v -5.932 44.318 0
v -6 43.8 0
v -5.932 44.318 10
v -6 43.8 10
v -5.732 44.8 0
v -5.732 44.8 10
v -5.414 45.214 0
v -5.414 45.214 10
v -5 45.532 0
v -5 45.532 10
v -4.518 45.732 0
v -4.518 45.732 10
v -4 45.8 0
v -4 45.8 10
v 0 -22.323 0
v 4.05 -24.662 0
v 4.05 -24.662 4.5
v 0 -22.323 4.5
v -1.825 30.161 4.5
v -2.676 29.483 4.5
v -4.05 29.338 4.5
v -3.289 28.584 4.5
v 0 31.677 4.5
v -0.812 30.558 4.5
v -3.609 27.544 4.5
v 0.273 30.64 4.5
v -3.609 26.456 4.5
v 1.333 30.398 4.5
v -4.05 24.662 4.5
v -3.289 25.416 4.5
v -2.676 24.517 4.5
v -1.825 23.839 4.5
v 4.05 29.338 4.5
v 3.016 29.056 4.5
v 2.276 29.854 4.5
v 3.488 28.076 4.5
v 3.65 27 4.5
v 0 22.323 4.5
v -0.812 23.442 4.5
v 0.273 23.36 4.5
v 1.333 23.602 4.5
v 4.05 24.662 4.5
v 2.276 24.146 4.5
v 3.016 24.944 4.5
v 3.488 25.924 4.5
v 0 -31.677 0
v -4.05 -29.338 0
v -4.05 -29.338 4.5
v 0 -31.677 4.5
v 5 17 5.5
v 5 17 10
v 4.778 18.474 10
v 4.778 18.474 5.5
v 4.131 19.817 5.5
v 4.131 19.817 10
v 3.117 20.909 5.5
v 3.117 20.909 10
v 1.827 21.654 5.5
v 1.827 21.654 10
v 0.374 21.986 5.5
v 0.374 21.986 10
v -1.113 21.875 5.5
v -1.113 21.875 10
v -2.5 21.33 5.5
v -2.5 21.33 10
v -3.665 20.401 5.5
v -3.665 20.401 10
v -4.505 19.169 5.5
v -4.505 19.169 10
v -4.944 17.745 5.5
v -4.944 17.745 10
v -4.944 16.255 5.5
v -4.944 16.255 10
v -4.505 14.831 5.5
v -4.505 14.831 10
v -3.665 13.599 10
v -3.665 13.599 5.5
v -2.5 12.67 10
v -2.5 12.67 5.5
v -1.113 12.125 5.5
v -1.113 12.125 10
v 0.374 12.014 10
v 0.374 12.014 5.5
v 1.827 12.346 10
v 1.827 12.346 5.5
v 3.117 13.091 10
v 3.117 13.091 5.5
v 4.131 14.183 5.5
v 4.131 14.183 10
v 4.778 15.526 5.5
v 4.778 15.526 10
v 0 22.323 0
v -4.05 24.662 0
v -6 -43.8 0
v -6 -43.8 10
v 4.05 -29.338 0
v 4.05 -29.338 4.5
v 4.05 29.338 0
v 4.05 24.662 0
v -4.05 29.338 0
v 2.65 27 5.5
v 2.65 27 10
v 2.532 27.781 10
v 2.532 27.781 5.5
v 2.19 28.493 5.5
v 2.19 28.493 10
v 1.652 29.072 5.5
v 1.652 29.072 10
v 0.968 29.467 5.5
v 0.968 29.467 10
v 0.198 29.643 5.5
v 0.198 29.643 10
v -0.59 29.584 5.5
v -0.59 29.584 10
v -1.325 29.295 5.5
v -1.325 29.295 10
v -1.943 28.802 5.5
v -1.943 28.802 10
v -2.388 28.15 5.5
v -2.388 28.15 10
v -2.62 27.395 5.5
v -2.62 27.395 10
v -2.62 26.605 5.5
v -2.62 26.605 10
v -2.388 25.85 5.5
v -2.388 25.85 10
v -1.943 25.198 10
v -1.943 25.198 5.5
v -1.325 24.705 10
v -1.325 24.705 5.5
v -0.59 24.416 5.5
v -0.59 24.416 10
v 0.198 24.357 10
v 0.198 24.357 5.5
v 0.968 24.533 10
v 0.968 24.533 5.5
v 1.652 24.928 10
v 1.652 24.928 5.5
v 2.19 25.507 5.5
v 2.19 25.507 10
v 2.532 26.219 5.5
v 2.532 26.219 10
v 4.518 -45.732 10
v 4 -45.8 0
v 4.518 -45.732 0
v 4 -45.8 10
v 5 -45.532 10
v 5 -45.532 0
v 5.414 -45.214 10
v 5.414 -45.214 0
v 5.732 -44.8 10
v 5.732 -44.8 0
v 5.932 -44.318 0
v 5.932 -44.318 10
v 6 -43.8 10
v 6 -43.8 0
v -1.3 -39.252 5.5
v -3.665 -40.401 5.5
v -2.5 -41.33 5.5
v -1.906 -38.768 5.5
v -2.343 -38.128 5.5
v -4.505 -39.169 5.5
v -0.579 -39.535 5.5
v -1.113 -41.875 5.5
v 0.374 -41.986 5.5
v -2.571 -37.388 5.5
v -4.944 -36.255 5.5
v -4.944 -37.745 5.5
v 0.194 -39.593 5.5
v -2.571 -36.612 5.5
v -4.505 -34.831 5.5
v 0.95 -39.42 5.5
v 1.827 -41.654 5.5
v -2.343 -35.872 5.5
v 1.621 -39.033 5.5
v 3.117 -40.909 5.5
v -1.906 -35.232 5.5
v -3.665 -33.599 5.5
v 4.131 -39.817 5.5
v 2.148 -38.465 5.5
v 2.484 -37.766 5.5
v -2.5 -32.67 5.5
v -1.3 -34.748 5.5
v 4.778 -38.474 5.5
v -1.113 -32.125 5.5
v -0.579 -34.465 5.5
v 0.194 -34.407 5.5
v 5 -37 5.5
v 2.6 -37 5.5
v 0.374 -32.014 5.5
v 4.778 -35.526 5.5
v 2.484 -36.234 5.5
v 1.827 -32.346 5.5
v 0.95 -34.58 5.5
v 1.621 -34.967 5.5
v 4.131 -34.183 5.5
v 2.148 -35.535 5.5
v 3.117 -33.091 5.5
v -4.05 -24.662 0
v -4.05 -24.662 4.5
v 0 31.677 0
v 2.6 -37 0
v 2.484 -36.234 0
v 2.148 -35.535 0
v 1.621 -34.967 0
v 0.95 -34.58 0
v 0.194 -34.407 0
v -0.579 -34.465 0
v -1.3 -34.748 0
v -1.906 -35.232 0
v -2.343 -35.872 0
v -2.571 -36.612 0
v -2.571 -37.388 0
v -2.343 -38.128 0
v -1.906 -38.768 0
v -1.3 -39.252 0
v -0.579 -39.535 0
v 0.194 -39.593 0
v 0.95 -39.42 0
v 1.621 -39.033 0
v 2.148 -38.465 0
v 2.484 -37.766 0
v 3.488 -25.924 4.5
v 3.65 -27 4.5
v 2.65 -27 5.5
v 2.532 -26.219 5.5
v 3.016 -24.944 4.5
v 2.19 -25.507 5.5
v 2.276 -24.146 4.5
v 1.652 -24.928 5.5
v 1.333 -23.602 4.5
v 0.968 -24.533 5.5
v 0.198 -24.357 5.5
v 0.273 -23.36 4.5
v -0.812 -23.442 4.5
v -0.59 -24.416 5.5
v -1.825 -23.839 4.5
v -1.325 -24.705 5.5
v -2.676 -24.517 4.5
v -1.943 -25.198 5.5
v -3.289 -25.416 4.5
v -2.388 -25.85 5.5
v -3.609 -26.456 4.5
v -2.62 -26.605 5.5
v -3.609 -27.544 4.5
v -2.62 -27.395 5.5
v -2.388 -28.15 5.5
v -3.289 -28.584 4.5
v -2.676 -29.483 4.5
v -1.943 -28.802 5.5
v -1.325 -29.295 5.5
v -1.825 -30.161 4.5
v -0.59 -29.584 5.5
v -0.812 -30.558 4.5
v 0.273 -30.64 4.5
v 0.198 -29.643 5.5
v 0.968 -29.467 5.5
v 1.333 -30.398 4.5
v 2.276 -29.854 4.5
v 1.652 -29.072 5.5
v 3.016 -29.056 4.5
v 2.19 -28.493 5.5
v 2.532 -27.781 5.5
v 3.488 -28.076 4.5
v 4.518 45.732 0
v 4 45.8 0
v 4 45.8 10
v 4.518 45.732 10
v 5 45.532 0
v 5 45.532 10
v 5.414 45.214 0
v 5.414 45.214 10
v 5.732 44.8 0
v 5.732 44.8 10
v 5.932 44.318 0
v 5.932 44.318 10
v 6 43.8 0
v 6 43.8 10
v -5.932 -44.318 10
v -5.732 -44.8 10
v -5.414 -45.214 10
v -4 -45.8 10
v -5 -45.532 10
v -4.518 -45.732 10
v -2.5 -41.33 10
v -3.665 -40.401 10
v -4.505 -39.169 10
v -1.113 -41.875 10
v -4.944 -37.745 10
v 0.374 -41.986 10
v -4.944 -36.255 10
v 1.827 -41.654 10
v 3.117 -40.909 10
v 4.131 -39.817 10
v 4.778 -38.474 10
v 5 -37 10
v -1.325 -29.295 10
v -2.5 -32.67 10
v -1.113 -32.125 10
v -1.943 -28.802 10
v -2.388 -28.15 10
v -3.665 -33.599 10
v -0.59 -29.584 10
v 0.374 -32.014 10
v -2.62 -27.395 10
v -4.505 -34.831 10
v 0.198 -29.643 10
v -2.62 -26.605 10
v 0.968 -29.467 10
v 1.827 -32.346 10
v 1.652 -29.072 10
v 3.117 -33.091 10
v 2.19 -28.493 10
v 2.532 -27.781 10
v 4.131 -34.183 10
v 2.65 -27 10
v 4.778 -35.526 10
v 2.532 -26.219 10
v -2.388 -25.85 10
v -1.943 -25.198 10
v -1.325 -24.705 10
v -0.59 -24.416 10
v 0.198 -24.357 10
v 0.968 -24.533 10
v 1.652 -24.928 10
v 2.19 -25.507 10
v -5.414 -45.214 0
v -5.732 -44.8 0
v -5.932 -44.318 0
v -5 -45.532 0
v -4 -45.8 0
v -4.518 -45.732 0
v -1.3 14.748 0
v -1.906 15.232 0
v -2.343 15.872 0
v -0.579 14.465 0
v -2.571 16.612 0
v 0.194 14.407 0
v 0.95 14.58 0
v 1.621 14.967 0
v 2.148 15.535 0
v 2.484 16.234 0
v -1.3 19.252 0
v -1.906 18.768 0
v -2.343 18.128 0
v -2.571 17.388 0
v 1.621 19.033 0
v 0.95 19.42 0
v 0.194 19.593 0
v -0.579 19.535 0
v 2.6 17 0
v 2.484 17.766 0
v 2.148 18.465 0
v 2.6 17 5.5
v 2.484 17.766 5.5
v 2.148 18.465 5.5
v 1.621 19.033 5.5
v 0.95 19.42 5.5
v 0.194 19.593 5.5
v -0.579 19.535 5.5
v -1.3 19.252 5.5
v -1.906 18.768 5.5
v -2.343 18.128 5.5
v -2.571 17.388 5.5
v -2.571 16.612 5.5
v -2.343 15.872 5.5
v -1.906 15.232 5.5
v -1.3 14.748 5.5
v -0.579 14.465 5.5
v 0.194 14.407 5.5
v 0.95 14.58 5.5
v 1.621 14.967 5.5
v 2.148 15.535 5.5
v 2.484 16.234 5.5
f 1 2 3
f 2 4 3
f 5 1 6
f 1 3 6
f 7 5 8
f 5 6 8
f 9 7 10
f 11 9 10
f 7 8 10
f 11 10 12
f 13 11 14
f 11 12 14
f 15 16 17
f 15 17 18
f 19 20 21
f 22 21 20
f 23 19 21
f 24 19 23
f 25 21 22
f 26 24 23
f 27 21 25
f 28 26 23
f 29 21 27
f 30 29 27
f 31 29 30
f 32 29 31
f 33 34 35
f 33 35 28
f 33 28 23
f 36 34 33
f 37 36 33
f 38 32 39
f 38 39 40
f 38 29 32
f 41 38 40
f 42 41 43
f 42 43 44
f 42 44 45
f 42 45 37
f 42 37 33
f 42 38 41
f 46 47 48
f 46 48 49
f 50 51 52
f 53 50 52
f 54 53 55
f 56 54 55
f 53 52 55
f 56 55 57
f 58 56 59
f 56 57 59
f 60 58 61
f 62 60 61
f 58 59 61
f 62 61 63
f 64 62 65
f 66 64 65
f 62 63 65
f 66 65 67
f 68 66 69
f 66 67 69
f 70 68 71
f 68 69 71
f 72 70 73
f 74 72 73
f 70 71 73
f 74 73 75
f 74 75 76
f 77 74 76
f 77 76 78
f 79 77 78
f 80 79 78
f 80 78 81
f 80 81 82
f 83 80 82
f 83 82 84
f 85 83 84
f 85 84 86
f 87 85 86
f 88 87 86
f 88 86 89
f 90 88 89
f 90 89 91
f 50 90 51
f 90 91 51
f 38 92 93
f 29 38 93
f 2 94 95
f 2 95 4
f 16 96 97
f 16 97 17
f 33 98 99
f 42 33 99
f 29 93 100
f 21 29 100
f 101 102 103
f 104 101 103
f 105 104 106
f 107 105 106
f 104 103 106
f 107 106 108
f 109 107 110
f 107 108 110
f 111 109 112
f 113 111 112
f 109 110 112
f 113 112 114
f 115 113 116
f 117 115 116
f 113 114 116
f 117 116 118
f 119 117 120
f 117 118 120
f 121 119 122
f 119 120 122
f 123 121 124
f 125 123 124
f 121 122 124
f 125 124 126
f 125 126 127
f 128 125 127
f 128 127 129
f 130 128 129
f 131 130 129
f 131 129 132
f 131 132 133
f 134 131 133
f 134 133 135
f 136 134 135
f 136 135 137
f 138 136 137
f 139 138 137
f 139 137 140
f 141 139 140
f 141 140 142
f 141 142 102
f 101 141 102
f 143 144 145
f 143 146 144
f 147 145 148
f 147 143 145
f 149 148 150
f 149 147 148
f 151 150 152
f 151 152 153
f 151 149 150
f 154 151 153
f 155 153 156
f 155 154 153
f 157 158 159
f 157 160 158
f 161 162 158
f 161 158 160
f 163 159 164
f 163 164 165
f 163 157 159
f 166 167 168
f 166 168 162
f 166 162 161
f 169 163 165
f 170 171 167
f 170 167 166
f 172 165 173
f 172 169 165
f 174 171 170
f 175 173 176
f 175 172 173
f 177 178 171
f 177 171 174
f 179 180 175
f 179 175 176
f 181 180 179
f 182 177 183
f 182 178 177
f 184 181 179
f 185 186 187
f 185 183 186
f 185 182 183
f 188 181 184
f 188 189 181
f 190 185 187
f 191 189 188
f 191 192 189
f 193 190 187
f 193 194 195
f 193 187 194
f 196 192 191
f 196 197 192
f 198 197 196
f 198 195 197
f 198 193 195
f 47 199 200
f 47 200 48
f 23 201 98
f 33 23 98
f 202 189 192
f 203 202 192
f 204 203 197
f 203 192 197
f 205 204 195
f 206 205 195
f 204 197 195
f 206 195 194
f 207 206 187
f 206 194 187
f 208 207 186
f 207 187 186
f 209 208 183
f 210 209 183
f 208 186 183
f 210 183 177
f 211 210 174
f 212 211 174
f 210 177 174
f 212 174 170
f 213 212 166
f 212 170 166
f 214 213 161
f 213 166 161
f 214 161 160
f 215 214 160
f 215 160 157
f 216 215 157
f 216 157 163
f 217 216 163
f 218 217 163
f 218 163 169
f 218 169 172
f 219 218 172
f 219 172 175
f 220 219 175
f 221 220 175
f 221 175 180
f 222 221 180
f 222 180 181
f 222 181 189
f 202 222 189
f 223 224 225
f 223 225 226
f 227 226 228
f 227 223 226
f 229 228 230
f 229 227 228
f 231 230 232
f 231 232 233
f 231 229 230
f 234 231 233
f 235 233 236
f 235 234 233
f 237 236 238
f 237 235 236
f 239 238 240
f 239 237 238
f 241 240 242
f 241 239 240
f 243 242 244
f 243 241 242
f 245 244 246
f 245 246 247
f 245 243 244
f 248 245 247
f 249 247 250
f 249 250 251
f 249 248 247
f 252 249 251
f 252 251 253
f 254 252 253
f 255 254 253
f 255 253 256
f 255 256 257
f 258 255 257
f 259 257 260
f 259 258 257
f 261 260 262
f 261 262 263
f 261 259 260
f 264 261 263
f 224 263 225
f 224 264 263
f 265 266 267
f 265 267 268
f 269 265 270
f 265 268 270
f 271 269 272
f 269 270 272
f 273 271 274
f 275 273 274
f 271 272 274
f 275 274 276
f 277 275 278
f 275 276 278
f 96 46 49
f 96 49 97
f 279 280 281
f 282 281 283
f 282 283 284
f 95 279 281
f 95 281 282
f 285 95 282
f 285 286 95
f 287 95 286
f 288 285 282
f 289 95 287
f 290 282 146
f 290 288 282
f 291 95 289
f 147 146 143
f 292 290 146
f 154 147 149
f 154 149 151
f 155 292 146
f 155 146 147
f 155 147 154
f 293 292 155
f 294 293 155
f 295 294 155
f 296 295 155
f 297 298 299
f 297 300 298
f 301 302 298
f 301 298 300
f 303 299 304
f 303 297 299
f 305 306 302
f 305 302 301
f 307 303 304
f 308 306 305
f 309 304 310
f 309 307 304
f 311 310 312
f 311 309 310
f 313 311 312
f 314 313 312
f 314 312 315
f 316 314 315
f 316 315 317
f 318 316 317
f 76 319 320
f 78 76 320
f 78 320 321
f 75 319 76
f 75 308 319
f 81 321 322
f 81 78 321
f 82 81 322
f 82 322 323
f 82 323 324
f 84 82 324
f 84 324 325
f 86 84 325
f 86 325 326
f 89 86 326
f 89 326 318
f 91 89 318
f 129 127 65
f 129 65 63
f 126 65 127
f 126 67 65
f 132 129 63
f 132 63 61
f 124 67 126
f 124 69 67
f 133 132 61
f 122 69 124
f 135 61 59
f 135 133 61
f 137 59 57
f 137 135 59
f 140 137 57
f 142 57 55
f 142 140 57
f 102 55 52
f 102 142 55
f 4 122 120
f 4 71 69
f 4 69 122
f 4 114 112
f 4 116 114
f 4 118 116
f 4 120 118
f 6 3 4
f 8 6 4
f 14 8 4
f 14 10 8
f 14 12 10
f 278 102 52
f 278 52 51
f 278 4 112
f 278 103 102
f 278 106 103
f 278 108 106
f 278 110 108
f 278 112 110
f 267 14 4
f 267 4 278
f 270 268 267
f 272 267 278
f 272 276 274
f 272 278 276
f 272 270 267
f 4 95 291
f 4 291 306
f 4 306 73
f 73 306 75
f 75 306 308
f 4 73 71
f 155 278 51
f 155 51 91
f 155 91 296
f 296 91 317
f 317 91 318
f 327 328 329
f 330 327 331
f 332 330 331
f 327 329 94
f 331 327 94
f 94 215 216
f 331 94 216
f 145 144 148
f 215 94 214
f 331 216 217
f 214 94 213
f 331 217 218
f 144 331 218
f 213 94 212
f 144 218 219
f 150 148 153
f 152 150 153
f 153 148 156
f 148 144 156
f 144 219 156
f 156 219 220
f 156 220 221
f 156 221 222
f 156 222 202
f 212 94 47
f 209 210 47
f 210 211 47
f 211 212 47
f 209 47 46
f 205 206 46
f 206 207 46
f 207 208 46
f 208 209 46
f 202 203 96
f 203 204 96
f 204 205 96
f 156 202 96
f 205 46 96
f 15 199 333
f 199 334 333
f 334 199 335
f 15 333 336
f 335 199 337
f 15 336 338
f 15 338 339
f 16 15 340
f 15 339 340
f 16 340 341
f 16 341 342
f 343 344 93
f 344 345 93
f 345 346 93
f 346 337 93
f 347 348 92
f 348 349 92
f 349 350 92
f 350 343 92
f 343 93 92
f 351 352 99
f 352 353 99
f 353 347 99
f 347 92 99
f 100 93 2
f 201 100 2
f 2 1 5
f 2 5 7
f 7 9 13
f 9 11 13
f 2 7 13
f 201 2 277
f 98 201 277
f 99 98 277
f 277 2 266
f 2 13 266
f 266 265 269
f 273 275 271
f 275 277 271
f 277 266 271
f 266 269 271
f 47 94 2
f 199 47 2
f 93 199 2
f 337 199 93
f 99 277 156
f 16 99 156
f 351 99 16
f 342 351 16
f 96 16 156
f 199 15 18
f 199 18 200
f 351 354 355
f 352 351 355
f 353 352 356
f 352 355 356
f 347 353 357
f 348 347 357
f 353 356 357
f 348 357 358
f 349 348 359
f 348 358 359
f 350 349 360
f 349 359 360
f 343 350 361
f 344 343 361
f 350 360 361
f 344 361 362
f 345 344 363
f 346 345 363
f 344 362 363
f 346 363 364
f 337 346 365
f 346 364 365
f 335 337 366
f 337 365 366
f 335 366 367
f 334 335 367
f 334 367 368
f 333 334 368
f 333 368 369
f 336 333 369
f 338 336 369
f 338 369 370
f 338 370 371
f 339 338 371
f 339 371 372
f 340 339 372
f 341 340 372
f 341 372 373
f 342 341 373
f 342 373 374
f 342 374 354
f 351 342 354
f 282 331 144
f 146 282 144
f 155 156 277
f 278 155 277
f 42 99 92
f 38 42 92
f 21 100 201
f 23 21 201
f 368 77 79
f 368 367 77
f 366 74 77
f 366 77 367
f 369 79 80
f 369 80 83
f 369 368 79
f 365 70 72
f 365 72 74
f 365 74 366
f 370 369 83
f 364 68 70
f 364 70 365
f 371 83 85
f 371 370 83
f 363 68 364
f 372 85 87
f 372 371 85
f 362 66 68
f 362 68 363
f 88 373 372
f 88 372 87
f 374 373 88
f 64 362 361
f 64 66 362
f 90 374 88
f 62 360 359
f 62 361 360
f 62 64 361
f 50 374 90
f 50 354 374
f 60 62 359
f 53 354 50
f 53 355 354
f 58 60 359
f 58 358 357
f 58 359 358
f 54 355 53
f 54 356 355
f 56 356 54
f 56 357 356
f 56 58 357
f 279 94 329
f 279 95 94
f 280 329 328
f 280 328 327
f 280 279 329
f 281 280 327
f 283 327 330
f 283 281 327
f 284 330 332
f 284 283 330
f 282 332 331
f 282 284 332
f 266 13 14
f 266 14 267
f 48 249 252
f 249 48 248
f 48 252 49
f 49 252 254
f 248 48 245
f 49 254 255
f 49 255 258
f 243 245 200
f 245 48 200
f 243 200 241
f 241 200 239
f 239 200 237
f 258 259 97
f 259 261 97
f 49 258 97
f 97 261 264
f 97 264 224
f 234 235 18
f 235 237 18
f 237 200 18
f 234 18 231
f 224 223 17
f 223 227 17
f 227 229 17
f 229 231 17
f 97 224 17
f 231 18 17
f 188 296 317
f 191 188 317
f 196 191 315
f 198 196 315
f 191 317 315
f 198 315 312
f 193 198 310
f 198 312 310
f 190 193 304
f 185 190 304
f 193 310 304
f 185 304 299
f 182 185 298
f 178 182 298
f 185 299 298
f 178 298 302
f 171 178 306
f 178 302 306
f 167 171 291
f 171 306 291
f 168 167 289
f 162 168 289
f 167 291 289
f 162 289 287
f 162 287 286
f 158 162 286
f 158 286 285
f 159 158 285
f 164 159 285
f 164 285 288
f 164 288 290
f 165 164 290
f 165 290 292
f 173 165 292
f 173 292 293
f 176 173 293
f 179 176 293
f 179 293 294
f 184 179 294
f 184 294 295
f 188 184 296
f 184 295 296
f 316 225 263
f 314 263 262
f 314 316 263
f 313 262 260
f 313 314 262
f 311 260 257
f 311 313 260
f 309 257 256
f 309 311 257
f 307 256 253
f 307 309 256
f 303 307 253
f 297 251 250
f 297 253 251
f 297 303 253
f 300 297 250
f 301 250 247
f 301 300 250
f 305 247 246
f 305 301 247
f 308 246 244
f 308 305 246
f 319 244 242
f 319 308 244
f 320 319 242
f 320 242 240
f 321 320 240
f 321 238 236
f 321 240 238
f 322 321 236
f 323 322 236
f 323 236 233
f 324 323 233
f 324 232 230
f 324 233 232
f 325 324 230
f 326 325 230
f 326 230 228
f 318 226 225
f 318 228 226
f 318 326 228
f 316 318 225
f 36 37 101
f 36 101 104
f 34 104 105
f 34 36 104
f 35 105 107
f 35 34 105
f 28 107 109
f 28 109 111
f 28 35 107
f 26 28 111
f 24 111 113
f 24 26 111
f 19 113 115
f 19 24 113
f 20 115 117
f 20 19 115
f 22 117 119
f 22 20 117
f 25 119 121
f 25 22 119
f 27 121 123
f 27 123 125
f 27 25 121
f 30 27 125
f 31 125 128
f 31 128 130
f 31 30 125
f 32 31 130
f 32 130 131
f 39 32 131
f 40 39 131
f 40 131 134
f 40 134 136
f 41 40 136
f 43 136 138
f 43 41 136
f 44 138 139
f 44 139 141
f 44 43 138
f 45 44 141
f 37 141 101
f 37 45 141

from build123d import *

# Parameters (mm, degrees)
SKETCH_W        = 12
SKETCH_H        = 91.6
PAD_DEPTH       = 10
SKETCH001_R     = 2.65
POCKET_DEPTH    = 195.845666
POCKET001_DEPTH = 4.5
SKETCH003_R     = 5
POCKET002_DEPTH = 4.5
SKETCH004_R     = 2.6
POCKET003_DEPTH = 10.001
FILLET_R        = 2
CHAMFER_SIZE    = 1


with BuildPart() as part:
    # Sketch → Pad (new body)
    with BuildSketch(Plane.XY):
        Rectangle(SKETCH_W, SKETCH_H)
    extrude(amount=PAD_DEPTH)

    # Sketch001 (on Face6 of Pad) → Pocket (cut, through all)
    with BuildSketch(Plane.XY.offset(10)):
        with Locations((0, 27)):
            Circle(SKETCH001_R)
    pocket = extrude(amount=-POCKET_DEPTH, mode=Mode.SUBTRACT)

    # Sketch002 (on Face4 of Pocket) → Pocket001 (cut)
    with BuildSketch(Plane(origin=(0, 0, 0), x_dir=(1, 0, 0), z_dir=(0, 0, -1))):
        Polygon((0, -22.323463), (-4.05, -24.661731), (-4.05, -29.338269), (0, -31.676537), (4.05, -29.338269), (4.05, -24.661731), align=None)
    pocket001 = extrude(amount=-POCKET001_DEPTH, mode=Mode.SUBTRACT)

    # Mirrored: Pocket001, Pocket across XZ
    add(pocket001.mirror(Plane.XZ), mode=Mode.SUBTRACT)
    add(pocket.mirror(Plane.XZ), mode=Mode.SUBTRACT)

    # Sketch003 (on Face5 of Mirrored) → Pocket002 (cut)
    with BuildSketch(Plane.XY.offset(10)):
        with Locations((0, 17)):
            Circle(SKETCH003_R)
        with Locations((0, -37)):
            Circle(SKETCH003_R)
    extrude(amount=-POCKET002_DEPTH, mode=Mode.SUBTRACT)

    # Sketch004 (on Face5 of Pocket002) → Pocket003 (cut, through all)
    with BuildSketch(Plane.XY.offset(10)):
        with Locations((0, 17)):
            Circle(SKETCH004_R)
        with Locations((0, -37)):
            Circle(SKETCH004_R)
    extrude(amount=-POCKET003_DEPTH, mode=Mode.SUBTRACT)

    # Fillet
    fillet_edges = [part.edges().sort_by_distance(p)[0] for p in [
        (-6, 45.8, 5),
        (-6, -45.8, 5),
        (6, -45.8, 5),
        (6, 45.8, 5),
    ]]
    fillet(fillet_edges, radius=FILLET_R)

    # Chamfer
    chamfer_edges = [part.edges().sort_by_distance(p)[0] for p in [
        (-2.65, 27, 4.5),
        (-2.65, -27, 4.5),
    ]]
    chamfer(chamfer_edges, length=CHAMFER_SIZE)


solid = part.part
